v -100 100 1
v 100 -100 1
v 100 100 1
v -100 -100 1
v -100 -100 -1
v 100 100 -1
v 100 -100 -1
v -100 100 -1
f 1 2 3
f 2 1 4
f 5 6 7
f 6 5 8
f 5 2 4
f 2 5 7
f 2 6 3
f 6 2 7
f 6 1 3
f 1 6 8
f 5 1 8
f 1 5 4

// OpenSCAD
// Parameters
sheet_length = 200; //[100:400:1]
sheet_width  = 200; //[100:400:1]
sheet_thickness = 2; //[1:6:0.5]

// Robust minimums to avoid "blank" renders from degenerate geometry
min_thickness = 0.8;
min_xy = 1;

L = max(sheet_length, min_xy);
W = max(sheet_width,  min_xy);
t = max(sheet_thickness, min_thickness);

// Geometry (one connected solid)
color([0.85, 0.85, 0.8])
cube([L, W, t], center=true);
